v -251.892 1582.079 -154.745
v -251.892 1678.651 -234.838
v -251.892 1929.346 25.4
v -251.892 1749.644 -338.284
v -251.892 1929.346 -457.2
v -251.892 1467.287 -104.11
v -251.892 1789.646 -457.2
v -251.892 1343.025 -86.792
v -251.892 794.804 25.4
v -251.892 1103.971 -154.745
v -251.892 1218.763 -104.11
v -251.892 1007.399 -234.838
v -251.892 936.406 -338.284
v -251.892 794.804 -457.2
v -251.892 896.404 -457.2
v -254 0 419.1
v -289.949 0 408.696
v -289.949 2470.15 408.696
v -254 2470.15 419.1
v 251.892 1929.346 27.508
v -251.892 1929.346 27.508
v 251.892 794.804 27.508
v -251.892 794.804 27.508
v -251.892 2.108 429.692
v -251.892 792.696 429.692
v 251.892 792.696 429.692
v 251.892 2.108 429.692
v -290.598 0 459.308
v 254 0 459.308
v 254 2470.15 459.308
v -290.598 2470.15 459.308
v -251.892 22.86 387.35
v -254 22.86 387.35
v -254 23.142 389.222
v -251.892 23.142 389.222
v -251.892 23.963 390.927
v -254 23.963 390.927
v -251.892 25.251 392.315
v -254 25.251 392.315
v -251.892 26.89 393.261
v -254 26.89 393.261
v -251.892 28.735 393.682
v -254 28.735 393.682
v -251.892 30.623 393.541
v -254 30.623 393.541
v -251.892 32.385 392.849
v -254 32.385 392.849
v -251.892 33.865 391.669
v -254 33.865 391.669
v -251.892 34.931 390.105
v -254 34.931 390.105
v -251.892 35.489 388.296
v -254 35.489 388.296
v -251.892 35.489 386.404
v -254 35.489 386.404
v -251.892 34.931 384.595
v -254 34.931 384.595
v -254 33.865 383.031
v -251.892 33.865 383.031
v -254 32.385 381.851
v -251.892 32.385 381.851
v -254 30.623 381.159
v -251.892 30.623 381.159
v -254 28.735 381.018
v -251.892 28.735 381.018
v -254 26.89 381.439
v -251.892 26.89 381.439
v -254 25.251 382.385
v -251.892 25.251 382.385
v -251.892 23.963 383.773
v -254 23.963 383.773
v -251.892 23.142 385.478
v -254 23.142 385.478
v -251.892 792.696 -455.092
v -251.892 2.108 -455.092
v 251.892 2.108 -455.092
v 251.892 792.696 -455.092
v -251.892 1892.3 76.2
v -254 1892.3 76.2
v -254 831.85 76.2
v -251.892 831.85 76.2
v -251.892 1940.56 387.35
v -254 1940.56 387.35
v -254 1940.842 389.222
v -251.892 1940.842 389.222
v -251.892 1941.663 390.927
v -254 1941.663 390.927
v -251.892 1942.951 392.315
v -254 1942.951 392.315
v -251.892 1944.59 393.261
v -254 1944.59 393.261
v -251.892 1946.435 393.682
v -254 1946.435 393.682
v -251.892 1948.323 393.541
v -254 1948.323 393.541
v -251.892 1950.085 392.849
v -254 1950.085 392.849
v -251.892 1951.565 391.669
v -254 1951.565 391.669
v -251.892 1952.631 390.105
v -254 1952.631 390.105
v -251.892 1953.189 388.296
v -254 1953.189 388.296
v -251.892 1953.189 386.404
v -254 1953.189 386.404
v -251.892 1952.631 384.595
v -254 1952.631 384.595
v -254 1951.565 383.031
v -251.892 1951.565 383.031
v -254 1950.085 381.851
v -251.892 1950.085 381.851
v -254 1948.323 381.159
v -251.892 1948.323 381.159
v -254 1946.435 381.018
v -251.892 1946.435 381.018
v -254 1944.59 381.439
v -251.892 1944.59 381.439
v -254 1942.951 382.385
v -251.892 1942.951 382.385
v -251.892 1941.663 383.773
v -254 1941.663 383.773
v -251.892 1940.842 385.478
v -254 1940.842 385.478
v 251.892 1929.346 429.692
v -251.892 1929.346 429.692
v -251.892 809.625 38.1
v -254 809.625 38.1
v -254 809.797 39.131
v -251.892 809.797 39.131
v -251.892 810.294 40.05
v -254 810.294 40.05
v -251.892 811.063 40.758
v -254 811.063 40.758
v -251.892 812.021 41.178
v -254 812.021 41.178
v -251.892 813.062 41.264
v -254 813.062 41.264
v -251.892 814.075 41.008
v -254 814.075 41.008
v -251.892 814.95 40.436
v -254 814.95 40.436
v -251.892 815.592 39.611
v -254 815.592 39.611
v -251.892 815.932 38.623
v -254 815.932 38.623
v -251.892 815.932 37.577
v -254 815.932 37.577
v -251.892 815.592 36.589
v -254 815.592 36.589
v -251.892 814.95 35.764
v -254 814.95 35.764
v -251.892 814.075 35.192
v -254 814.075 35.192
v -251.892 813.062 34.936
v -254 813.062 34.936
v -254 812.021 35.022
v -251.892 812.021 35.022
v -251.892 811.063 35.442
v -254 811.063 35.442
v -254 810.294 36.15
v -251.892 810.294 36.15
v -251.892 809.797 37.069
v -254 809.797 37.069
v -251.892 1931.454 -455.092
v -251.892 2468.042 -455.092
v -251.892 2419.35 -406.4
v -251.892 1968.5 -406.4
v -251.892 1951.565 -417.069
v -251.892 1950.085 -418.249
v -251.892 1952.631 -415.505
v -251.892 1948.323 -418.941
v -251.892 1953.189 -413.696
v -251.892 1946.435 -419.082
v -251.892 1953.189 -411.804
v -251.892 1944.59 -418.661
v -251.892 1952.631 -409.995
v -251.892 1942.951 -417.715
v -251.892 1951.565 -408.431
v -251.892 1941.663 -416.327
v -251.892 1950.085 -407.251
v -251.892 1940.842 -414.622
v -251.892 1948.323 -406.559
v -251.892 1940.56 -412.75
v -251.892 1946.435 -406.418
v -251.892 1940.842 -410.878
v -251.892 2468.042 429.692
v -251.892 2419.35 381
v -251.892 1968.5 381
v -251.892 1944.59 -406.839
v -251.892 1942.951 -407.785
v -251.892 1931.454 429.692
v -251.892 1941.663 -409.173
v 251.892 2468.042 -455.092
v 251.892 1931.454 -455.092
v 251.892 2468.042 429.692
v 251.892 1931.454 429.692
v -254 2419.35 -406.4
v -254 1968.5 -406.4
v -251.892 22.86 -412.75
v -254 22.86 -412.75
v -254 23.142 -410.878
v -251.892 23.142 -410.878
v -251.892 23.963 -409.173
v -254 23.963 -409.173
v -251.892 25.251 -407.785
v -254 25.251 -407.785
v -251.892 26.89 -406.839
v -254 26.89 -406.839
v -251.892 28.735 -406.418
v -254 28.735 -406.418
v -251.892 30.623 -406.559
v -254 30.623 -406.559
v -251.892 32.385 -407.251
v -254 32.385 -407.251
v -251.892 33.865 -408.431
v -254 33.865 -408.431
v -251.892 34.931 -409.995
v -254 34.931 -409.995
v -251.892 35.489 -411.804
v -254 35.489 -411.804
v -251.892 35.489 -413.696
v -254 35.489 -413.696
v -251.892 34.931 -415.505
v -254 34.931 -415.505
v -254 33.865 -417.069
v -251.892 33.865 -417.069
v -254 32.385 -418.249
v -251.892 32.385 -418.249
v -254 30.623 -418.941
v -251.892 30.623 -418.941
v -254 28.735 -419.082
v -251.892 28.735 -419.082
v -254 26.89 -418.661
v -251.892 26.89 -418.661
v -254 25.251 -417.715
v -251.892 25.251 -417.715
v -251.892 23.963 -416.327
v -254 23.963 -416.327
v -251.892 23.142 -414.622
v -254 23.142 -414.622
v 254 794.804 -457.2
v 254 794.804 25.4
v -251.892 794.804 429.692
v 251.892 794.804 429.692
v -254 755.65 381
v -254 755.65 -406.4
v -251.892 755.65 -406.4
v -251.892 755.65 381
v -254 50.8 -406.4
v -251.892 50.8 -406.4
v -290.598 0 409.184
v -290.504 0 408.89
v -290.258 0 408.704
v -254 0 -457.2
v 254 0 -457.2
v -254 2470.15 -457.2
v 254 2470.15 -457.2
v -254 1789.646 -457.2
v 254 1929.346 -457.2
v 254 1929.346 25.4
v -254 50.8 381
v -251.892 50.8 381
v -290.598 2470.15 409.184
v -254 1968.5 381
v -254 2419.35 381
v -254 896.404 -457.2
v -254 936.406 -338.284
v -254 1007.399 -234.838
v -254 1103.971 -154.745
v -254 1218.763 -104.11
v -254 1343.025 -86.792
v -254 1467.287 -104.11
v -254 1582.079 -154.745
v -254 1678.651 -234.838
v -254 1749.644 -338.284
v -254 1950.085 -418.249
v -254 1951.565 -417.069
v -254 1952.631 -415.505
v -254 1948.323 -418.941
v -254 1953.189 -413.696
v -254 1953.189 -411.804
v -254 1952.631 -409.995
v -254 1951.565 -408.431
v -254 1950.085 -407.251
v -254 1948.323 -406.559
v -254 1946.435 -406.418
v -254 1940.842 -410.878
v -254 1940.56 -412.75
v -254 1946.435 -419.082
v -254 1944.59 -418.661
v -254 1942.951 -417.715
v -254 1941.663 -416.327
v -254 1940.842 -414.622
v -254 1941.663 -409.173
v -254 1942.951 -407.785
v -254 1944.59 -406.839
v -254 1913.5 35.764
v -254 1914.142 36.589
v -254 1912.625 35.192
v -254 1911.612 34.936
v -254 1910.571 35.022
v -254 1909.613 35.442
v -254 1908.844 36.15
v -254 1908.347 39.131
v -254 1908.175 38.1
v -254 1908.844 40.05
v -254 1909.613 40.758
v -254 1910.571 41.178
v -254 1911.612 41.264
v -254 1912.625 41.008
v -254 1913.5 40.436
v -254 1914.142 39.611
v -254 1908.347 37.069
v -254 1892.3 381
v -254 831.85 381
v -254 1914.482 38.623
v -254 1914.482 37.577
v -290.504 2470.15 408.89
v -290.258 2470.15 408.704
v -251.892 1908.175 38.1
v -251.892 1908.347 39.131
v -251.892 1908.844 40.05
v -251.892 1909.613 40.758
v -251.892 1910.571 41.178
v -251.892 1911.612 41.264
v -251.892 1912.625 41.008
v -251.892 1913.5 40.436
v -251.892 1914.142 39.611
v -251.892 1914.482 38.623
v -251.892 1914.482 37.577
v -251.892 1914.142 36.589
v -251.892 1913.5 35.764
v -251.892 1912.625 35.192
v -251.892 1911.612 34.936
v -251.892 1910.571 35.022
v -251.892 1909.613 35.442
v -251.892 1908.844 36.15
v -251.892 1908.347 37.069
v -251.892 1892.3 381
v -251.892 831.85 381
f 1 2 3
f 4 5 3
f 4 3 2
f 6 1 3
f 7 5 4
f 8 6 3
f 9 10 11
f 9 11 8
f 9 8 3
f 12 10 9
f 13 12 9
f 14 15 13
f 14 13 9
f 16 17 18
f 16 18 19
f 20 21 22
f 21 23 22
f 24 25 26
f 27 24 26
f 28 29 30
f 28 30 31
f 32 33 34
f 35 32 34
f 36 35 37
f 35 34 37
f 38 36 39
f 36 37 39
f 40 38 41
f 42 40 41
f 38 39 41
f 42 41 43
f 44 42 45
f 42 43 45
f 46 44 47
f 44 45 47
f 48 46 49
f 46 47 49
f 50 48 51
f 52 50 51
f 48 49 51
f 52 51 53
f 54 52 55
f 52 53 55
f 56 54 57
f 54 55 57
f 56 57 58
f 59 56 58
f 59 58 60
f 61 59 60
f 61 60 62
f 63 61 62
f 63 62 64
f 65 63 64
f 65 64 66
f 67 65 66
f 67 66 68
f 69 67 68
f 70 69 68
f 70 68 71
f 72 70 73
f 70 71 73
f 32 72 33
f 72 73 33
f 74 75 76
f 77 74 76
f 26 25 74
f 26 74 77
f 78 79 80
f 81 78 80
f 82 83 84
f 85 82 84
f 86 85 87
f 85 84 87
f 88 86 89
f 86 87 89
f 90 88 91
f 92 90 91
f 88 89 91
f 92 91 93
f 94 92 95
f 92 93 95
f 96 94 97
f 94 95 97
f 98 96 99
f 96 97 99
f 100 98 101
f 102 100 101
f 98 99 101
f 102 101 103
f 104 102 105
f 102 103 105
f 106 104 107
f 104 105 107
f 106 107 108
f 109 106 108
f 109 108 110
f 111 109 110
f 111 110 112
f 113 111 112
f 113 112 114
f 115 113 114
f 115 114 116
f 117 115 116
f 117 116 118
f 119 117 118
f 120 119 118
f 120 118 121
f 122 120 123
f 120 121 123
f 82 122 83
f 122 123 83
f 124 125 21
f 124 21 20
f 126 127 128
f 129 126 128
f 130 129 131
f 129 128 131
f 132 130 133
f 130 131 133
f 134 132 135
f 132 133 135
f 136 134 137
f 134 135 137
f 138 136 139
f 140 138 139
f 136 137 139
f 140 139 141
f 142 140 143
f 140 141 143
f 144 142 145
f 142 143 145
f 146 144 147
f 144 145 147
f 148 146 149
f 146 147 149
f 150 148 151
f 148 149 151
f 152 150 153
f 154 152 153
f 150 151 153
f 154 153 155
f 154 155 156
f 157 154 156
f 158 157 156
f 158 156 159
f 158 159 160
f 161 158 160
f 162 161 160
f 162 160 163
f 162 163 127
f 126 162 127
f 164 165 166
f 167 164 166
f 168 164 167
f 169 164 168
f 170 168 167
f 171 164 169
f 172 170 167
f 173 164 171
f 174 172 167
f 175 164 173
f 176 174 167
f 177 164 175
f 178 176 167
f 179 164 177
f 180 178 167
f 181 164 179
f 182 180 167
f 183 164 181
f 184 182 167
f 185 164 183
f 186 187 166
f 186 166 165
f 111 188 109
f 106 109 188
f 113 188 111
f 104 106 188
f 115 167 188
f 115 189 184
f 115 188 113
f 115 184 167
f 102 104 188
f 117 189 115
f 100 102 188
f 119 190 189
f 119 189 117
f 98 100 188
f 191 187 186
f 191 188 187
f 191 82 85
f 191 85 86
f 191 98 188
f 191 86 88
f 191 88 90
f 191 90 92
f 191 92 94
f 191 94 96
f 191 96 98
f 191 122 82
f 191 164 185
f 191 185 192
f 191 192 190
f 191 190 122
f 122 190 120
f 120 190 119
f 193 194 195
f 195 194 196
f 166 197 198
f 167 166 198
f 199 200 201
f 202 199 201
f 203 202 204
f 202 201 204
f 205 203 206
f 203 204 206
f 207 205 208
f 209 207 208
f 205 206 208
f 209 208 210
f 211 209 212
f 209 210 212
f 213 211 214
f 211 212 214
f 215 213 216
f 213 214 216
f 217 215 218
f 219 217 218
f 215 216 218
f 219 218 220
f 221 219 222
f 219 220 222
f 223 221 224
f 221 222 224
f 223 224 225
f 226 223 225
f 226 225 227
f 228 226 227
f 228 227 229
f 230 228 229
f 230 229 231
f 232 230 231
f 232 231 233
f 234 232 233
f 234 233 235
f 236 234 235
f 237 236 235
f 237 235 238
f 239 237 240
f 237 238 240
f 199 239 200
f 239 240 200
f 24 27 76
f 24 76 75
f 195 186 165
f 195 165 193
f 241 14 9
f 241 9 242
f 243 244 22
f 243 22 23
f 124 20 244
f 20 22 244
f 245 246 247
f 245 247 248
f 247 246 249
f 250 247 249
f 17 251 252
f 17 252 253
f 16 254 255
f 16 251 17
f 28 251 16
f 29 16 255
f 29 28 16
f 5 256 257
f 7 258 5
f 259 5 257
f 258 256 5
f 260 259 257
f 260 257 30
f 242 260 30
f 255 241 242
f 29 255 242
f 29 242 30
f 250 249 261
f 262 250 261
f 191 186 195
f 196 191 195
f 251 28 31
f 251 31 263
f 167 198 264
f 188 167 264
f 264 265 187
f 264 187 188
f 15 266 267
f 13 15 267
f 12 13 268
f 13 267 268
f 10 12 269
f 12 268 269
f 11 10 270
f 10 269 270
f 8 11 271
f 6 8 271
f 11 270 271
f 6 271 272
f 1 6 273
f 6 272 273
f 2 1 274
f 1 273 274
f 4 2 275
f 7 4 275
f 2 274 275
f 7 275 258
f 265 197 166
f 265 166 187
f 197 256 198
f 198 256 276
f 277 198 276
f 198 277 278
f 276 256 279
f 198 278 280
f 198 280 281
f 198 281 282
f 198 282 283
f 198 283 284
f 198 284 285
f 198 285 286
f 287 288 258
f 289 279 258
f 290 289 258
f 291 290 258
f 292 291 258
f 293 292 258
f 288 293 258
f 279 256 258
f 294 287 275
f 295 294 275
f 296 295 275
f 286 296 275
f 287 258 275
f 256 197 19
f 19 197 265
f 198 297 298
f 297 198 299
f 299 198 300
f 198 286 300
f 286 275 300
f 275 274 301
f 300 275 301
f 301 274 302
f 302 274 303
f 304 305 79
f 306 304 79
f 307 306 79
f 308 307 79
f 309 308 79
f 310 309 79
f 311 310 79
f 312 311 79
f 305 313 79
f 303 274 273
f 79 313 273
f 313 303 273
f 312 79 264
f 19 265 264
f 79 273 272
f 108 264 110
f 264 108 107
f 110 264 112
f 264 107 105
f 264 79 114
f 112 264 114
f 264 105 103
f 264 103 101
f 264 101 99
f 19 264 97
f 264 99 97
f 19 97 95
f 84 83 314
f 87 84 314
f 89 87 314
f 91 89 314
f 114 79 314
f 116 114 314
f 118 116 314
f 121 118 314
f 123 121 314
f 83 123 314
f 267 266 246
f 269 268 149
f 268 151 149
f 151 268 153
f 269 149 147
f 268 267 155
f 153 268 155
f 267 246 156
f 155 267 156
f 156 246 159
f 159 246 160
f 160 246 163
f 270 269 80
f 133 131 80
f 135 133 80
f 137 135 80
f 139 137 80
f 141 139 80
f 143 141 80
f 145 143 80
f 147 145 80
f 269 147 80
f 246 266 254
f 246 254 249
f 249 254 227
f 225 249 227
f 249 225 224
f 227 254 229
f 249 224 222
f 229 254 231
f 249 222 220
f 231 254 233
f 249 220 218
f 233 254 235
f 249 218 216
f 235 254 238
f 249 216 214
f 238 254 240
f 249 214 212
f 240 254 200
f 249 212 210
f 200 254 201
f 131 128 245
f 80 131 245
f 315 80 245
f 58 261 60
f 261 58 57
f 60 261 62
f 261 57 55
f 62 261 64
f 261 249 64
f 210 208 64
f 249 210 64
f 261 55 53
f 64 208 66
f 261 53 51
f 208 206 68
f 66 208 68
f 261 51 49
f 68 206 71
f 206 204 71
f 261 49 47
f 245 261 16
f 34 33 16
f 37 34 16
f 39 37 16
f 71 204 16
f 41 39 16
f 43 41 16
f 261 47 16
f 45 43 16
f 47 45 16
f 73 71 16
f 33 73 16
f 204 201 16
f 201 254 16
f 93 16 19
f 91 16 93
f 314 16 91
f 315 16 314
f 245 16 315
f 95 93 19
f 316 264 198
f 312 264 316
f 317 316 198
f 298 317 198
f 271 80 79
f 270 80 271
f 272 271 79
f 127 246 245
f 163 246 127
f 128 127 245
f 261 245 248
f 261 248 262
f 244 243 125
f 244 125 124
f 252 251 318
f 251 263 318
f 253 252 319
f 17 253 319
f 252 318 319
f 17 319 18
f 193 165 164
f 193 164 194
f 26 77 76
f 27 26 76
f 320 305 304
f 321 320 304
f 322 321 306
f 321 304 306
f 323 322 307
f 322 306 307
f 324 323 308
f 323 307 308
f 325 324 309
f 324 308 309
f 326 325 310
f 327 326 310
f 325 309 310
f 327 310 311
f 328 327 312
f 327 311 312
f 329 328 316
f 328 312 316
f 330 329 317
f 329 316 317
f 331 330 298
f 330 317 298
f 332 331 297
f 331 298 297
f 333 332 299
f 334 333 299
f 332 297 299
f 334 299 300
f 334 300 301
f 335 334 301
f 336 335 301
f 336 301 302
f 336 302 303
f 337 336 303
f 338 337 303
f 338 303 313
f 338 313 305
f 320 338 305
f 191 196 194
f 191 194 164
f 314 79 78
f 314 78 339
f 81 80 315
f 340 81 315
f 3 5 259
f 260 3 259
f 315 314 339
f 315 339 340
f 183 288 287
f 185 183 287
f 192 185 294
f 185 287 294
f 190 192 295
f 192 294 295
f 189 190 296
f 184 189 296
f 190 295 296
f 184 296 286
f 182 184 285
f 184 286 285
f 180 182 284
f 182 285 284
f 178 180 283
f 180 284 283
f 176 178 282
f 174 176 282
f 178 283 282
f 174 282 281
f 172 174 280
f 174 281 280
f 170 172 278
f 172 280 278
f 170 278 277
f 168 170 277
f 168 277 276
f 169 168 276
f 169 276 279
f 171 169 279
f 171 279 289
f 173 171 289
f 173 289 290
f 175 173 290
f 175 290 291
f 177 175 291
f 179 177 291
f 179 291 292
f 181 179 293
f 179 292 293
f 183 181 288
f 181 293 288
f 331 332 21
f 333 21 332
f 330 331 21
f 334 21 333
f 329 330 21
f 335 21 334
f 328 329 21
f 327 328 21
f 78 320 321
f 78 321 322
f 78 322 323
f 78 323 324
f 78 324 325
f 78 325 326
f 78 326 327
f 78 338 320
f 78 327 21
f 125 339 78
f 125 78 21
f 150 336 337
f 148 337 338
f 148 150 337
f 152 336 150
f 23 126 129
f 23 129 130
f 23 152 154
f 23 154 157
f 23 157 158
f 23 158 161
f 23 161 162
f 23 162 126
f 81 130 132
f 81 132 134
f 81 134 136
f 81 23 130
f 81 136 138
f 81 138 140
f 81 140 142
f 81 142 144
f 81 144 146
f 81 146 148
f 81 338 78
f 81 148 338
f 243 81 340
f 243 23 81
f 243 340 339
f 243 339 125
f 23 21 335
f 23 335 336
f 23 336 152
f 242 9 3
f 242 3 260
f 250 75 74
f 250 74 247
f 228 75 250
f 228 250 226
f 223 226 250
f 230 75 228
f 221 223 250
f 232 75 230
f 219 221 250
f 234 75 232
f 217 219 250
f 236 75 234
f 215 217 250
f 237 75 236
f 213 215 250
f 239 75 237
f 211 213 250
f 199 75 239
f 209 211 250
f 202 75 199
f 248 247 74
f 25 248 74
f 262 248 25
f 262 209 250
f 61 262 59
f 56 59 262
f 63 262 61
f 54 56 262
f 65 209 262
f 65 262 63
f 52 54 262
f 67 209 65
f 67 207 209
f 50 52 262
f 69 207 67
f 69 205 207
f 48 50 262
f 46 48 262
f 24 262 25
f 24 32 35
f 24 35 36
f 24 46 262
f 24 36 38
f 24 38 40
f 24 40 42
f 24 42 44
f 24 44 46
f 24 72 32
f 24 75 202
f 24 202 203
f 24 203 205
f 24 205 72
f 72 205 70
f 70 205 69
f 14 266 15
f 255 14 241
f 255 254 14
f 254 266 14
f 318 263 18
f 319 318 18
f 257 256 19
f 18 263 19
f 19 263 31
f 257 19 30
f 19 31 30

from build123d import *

# Parameters (mm, degrees)
F0_W      = 508
F0_H      = 914.4
F1_DEPTH  = 2470.15
F2_W      = 450.85
F2_H      = 787.4
F2_W_2    = 1060.45
F2_H_2    = 304.8
F2_W_3    = 704.85
F3_DEPTH  = 505.8918
F4_W      = 503.7836
F4_H      = 704.85
F5_DEPTH  = 48.6918
F6_W      = 503.7836
F6_H      = 704.85
F7_DEPTH  = 48.6918
F8_W      = 503.7836
F8_H      = 884.7836
F9_DEPTH  = 37.0459
F10_W     = 503.7836
F10_H     = 884.7836
F11_DEPTH = 48.6918
F12_W     = 503.7836
F12_H     = 1060.45
F13_DEPTH = 48.6918
F14_W     = 503.7836
F14_H     = 1060.45
F15_DEPTH = 48.6918
F16_W     = 503.7836
F16_H     = 402.1836
F17_DEPTH = 37.0459
F18_W     = 503.7836
F18_H     = 402.1836
F19_DEPTH = 37.0459
F20_W     = 503.7836
F20_H     = 450.85
F21_DEPTH = 48.6918
F22_W     = 503.7836
F22_H     = 450.85
F23_DEPTH = 48.6918
F24_W     = 503.7836
F24_H     = 884.7836
F25_DEPTH = 37.0459
F26_W     = 503.7836
F26_H     = 884.7836
F27_DEPTH = 48.6918
F28_W     = 505.8918
F28_H     = 1134.5418
F29_DEPTH = 482.6
F31_DEPTH = 508.001
F33_DEPTH = 2470.15
F34_R     = 0.508
F35_R     = 3.175
F36_DEPTH = 2.1082
F37_R     = 6.35
F38_DEPTH = 2.1082
F39_R     = 6.35
F40_DEPTH = 2.1082


# Not quite as in the source:
# - a feature names something its author has since deleted; it is built from what else it names


with BuildPart() as f1:
    # F0 (on Front) → F1 (new body)
    with BuildSketch(Plane.XZ):
        Rectangle(F0_W, F0_H)
    extrude(amount=-F1_DEPTH)

    # F2 (on face) → F3 (cut)
    with BuildSketch(Plane(origin=(-254, 0, 0), x_dir=(0, -1, 0), z_dir=(-1, 0, 0))):
        with Locations((-2193.925, -12.7)):
            Rectangle(F2_W, F2_H)
        with Locations((-1362.075, 228.6)):
            Rectangle(F2_W_2, F2_H_2)
        with Locations((-403.225, -12.7)):
            Rectangle(F2_W_3, F2_H)
    extrude(amount=-F3_DEPTH, mode=Mode.SUBTRACT)

    # F4 (on face) → F5 (cut)
    with BuildSketch(Plane.XY.offset(-406.4)):
        with Locations((0, 403.225)):
            Rectangle(F4_W, F4_H)
    extrude(amount=-F5_DEPTH, mode=Mode.SUBTRACT)

    # F6 (on face) → F7 (cut)
    with BuildSketch(Plane(origin=(0, 0, 381), x_dir=(1, 0, 0), z_dir=(0, 0, -1))):
        with Locations((0, -403.225)):
            Rectangle(F6_W, F6_H)
    extrude(amount=-F7_DEPTH, mode=Mode.SUBTRACT)

    # F8 (on face) → F9 (cut)
    with BuildSketch(Plane.XZ.offset(-755.65)):
        with Locations((0, -12.7)):
            Rectangle(F8_W, F8_H)
    extrude(amount=-F9_DEPTH, mode=Mode.SUBTRACT)

    # F10 (on face) → F11 (cut)
    with BuildSketch(Plane(origin=(0, 50.8, 0), x_dir=(-1, 0, 0), z_dir=(0, 1, 0))):
        with Locations((0, -12.7)):
            Rectangle(F10_W, F10_H)
    extrude(amount=-F11_DEPTH, mode=Mode.SUBTRACT)

    # F12 (on face) → F13 (cut)
    with BuildSketch(Plane.XY.offset(76.2)):
        with Locations((0, 1362.075)):
            Rectangle(F12_W, F12_H)
    extrude(amount=-F13_DEPTH, mode=Mode.SUBTRACT)

    # F14 (on face) → F15 (cut)
    with BuildSketch(Plane(origin=(0, 0, 381), x_dir=(1, 0, 0), z_dir=(0, 0, -1))):
        with Locations((0, -1362.075)):
            Rectangle(F14_W, F14_H)
    extrude(amount=-F15_DEPTH, mode=Mode.SUBTRACT)

    # F16 (on face) → F17 (cut)
    with BuildSketch(Plane(origin=(0, 831.85, 0), x_dir=(-1, 0, 0), z_dir=(0, 1, 0))):
        with Locations((0, 228.6)):
            Rectangle(F16_W, F16_H)
    extrude(amount=-F17_DEPTH, mode=Mode.SUBTRACT)

    # F18 (on face) → F19 (cut)
    with BuildSketch(Plane.XZ.offset(-1892.3)):
        with Locations((0, 228.6)):
            Rectangle(F18_W, F18_H)
    extrude(amount=-F19_DEPTH, mode=Mode.SUBTRACT)

    # F20 (on face) → F21 (cut)
    with BuildSketch(Plane.XY.offset(-406.4)):
        with Locations((0, 2193.925)):
            Rectangle(F20_W, F20_H)
    extrude(amount=-F21_DEPTH, mode=Mode.SUBTRACT)

    # F22 (on face) → F23 (cut)
    with BuildSketch(Plane(origin=(0, 0, 381), x_dir=(1, 0, 0), z_dir=(0, 0, -1))):
        with Locations((0, -2193.925)):
            Rectangle(F22_W, F22_H)
    extrude(amount=-F23_DEPTH, mode=Mode.SUBTRACT)

    # F24 (on face) → F25 (cut)
    with BuildSketch(Plane(origin=(0, 1968.5, 0), x_dir=(-1, 0, 0), z_dir=(0, 1, 0))):
        with Locations((0, -12.7)):
            Rectangle(F24_W, F24_H)
    extrude(amount=-F25_DEPTH, mode=Mode.SUBTRACT)

    # F26 (on face) → F27 (cut)
    with BuildSketch(Plane.XZ.offset(-2419.35)):
        with Locations((0, -12.7)):
            Rectangle(F26_W, F26_H)
    extrude(amount=-F27_DEPTH, mode=Mode.SUBTRACT)

    # F28 (on face) → F29 (cut)
    with BuildSketch(Plane(origin=(0, 0, -457.2), x_dir=(1, 0, 0), z_dir=(0, 0, -1))):
        with Locations((1.0541, -1362.075)):
            Rectangle(F28_W, F28_H)
    extrude(amount=-F29_DEPTH, mode=Mode.SUBTRACT)

    # F30 (on face) → F31 (cut, through all)
    with BuildSketch(Plane(origin=(-254, 0, 0), x_dir=(0, -1, 0), z_dir=(-1, 0, 0))):
        with BuildLine():
            Line((-1789.6459, -457.2), (-896.4041, -457.2))
            ThreePointArc((-896.4041, -457.2), (-1343.025, -86.7918), (-1789.6459, -457.2))
        make_face()
    extrude(amount=-F31_DEPTH, mode=Mode.SUBTRACT)

    # F32 (on face) → F33 (join, through all)
    with BuildSketch(Plane.XZ):
        Polygon((-290.5981389248, 459.3082), (-290.5981389248, 408.5082), (-254, 419.1), (-254, 457.2), (254, 457.2), (254, 459.3082), align=None)
    extrude(amount=-F33_DEPTH)

    # F34
    f34_edges = [f1.edges().sort_by_distance(p)[0] for p in [
        (-290.598139, 1235.075, 408.5082),
    ]]
    fillet(f34_edges, radius=F34_R)

    # F35 (on face) → F36 (cut, through all)
    with BuildSketch(Plane(origin=(-254, 0, 0), x_dir=(0, -1, 0), z_dir=(-1, 0, 0))):
        with Locations((-1911.35, 38.1)):
            Circle(F35_R)
        with Locations((-812.8, 38.1)):
            Circle(F35_R)
    extrude(amount=-F36_DEPTH, mode=Mode.SUBTRACT)

    # F37 (on face) → F38 (cut, through all)
    with BuildSketch(Plane(origin=(-254, 0, 0), x_dir=(0, -1, 0), z_dir=(-1, 0, 0))):
        with Locations((-29.21, 387.35)):
            Circle(F37_R)
        with Locations((-29.21, -412.75)):
            Circle(F37_R)
    extrude(amount=-F38_DEPTH, mode=Mode.SUBTRACT)

    # F39 (on face) → F40 (cut, through all)
    with BuildSketch(Plane(origin=(-254, 0, 0), x_dir=(0, -1, 0), z_dir=(-1, 0, 0))):
        with Locations((-1946.91, 387.35)):
            Circle(F39_R)
        with Locations((-1946.91, -412.75)):
            Circle(F39_R)
    extrude(amount=-F40_DEPTH, mode=Mode.SUBTRACT)


solid = f1.part
